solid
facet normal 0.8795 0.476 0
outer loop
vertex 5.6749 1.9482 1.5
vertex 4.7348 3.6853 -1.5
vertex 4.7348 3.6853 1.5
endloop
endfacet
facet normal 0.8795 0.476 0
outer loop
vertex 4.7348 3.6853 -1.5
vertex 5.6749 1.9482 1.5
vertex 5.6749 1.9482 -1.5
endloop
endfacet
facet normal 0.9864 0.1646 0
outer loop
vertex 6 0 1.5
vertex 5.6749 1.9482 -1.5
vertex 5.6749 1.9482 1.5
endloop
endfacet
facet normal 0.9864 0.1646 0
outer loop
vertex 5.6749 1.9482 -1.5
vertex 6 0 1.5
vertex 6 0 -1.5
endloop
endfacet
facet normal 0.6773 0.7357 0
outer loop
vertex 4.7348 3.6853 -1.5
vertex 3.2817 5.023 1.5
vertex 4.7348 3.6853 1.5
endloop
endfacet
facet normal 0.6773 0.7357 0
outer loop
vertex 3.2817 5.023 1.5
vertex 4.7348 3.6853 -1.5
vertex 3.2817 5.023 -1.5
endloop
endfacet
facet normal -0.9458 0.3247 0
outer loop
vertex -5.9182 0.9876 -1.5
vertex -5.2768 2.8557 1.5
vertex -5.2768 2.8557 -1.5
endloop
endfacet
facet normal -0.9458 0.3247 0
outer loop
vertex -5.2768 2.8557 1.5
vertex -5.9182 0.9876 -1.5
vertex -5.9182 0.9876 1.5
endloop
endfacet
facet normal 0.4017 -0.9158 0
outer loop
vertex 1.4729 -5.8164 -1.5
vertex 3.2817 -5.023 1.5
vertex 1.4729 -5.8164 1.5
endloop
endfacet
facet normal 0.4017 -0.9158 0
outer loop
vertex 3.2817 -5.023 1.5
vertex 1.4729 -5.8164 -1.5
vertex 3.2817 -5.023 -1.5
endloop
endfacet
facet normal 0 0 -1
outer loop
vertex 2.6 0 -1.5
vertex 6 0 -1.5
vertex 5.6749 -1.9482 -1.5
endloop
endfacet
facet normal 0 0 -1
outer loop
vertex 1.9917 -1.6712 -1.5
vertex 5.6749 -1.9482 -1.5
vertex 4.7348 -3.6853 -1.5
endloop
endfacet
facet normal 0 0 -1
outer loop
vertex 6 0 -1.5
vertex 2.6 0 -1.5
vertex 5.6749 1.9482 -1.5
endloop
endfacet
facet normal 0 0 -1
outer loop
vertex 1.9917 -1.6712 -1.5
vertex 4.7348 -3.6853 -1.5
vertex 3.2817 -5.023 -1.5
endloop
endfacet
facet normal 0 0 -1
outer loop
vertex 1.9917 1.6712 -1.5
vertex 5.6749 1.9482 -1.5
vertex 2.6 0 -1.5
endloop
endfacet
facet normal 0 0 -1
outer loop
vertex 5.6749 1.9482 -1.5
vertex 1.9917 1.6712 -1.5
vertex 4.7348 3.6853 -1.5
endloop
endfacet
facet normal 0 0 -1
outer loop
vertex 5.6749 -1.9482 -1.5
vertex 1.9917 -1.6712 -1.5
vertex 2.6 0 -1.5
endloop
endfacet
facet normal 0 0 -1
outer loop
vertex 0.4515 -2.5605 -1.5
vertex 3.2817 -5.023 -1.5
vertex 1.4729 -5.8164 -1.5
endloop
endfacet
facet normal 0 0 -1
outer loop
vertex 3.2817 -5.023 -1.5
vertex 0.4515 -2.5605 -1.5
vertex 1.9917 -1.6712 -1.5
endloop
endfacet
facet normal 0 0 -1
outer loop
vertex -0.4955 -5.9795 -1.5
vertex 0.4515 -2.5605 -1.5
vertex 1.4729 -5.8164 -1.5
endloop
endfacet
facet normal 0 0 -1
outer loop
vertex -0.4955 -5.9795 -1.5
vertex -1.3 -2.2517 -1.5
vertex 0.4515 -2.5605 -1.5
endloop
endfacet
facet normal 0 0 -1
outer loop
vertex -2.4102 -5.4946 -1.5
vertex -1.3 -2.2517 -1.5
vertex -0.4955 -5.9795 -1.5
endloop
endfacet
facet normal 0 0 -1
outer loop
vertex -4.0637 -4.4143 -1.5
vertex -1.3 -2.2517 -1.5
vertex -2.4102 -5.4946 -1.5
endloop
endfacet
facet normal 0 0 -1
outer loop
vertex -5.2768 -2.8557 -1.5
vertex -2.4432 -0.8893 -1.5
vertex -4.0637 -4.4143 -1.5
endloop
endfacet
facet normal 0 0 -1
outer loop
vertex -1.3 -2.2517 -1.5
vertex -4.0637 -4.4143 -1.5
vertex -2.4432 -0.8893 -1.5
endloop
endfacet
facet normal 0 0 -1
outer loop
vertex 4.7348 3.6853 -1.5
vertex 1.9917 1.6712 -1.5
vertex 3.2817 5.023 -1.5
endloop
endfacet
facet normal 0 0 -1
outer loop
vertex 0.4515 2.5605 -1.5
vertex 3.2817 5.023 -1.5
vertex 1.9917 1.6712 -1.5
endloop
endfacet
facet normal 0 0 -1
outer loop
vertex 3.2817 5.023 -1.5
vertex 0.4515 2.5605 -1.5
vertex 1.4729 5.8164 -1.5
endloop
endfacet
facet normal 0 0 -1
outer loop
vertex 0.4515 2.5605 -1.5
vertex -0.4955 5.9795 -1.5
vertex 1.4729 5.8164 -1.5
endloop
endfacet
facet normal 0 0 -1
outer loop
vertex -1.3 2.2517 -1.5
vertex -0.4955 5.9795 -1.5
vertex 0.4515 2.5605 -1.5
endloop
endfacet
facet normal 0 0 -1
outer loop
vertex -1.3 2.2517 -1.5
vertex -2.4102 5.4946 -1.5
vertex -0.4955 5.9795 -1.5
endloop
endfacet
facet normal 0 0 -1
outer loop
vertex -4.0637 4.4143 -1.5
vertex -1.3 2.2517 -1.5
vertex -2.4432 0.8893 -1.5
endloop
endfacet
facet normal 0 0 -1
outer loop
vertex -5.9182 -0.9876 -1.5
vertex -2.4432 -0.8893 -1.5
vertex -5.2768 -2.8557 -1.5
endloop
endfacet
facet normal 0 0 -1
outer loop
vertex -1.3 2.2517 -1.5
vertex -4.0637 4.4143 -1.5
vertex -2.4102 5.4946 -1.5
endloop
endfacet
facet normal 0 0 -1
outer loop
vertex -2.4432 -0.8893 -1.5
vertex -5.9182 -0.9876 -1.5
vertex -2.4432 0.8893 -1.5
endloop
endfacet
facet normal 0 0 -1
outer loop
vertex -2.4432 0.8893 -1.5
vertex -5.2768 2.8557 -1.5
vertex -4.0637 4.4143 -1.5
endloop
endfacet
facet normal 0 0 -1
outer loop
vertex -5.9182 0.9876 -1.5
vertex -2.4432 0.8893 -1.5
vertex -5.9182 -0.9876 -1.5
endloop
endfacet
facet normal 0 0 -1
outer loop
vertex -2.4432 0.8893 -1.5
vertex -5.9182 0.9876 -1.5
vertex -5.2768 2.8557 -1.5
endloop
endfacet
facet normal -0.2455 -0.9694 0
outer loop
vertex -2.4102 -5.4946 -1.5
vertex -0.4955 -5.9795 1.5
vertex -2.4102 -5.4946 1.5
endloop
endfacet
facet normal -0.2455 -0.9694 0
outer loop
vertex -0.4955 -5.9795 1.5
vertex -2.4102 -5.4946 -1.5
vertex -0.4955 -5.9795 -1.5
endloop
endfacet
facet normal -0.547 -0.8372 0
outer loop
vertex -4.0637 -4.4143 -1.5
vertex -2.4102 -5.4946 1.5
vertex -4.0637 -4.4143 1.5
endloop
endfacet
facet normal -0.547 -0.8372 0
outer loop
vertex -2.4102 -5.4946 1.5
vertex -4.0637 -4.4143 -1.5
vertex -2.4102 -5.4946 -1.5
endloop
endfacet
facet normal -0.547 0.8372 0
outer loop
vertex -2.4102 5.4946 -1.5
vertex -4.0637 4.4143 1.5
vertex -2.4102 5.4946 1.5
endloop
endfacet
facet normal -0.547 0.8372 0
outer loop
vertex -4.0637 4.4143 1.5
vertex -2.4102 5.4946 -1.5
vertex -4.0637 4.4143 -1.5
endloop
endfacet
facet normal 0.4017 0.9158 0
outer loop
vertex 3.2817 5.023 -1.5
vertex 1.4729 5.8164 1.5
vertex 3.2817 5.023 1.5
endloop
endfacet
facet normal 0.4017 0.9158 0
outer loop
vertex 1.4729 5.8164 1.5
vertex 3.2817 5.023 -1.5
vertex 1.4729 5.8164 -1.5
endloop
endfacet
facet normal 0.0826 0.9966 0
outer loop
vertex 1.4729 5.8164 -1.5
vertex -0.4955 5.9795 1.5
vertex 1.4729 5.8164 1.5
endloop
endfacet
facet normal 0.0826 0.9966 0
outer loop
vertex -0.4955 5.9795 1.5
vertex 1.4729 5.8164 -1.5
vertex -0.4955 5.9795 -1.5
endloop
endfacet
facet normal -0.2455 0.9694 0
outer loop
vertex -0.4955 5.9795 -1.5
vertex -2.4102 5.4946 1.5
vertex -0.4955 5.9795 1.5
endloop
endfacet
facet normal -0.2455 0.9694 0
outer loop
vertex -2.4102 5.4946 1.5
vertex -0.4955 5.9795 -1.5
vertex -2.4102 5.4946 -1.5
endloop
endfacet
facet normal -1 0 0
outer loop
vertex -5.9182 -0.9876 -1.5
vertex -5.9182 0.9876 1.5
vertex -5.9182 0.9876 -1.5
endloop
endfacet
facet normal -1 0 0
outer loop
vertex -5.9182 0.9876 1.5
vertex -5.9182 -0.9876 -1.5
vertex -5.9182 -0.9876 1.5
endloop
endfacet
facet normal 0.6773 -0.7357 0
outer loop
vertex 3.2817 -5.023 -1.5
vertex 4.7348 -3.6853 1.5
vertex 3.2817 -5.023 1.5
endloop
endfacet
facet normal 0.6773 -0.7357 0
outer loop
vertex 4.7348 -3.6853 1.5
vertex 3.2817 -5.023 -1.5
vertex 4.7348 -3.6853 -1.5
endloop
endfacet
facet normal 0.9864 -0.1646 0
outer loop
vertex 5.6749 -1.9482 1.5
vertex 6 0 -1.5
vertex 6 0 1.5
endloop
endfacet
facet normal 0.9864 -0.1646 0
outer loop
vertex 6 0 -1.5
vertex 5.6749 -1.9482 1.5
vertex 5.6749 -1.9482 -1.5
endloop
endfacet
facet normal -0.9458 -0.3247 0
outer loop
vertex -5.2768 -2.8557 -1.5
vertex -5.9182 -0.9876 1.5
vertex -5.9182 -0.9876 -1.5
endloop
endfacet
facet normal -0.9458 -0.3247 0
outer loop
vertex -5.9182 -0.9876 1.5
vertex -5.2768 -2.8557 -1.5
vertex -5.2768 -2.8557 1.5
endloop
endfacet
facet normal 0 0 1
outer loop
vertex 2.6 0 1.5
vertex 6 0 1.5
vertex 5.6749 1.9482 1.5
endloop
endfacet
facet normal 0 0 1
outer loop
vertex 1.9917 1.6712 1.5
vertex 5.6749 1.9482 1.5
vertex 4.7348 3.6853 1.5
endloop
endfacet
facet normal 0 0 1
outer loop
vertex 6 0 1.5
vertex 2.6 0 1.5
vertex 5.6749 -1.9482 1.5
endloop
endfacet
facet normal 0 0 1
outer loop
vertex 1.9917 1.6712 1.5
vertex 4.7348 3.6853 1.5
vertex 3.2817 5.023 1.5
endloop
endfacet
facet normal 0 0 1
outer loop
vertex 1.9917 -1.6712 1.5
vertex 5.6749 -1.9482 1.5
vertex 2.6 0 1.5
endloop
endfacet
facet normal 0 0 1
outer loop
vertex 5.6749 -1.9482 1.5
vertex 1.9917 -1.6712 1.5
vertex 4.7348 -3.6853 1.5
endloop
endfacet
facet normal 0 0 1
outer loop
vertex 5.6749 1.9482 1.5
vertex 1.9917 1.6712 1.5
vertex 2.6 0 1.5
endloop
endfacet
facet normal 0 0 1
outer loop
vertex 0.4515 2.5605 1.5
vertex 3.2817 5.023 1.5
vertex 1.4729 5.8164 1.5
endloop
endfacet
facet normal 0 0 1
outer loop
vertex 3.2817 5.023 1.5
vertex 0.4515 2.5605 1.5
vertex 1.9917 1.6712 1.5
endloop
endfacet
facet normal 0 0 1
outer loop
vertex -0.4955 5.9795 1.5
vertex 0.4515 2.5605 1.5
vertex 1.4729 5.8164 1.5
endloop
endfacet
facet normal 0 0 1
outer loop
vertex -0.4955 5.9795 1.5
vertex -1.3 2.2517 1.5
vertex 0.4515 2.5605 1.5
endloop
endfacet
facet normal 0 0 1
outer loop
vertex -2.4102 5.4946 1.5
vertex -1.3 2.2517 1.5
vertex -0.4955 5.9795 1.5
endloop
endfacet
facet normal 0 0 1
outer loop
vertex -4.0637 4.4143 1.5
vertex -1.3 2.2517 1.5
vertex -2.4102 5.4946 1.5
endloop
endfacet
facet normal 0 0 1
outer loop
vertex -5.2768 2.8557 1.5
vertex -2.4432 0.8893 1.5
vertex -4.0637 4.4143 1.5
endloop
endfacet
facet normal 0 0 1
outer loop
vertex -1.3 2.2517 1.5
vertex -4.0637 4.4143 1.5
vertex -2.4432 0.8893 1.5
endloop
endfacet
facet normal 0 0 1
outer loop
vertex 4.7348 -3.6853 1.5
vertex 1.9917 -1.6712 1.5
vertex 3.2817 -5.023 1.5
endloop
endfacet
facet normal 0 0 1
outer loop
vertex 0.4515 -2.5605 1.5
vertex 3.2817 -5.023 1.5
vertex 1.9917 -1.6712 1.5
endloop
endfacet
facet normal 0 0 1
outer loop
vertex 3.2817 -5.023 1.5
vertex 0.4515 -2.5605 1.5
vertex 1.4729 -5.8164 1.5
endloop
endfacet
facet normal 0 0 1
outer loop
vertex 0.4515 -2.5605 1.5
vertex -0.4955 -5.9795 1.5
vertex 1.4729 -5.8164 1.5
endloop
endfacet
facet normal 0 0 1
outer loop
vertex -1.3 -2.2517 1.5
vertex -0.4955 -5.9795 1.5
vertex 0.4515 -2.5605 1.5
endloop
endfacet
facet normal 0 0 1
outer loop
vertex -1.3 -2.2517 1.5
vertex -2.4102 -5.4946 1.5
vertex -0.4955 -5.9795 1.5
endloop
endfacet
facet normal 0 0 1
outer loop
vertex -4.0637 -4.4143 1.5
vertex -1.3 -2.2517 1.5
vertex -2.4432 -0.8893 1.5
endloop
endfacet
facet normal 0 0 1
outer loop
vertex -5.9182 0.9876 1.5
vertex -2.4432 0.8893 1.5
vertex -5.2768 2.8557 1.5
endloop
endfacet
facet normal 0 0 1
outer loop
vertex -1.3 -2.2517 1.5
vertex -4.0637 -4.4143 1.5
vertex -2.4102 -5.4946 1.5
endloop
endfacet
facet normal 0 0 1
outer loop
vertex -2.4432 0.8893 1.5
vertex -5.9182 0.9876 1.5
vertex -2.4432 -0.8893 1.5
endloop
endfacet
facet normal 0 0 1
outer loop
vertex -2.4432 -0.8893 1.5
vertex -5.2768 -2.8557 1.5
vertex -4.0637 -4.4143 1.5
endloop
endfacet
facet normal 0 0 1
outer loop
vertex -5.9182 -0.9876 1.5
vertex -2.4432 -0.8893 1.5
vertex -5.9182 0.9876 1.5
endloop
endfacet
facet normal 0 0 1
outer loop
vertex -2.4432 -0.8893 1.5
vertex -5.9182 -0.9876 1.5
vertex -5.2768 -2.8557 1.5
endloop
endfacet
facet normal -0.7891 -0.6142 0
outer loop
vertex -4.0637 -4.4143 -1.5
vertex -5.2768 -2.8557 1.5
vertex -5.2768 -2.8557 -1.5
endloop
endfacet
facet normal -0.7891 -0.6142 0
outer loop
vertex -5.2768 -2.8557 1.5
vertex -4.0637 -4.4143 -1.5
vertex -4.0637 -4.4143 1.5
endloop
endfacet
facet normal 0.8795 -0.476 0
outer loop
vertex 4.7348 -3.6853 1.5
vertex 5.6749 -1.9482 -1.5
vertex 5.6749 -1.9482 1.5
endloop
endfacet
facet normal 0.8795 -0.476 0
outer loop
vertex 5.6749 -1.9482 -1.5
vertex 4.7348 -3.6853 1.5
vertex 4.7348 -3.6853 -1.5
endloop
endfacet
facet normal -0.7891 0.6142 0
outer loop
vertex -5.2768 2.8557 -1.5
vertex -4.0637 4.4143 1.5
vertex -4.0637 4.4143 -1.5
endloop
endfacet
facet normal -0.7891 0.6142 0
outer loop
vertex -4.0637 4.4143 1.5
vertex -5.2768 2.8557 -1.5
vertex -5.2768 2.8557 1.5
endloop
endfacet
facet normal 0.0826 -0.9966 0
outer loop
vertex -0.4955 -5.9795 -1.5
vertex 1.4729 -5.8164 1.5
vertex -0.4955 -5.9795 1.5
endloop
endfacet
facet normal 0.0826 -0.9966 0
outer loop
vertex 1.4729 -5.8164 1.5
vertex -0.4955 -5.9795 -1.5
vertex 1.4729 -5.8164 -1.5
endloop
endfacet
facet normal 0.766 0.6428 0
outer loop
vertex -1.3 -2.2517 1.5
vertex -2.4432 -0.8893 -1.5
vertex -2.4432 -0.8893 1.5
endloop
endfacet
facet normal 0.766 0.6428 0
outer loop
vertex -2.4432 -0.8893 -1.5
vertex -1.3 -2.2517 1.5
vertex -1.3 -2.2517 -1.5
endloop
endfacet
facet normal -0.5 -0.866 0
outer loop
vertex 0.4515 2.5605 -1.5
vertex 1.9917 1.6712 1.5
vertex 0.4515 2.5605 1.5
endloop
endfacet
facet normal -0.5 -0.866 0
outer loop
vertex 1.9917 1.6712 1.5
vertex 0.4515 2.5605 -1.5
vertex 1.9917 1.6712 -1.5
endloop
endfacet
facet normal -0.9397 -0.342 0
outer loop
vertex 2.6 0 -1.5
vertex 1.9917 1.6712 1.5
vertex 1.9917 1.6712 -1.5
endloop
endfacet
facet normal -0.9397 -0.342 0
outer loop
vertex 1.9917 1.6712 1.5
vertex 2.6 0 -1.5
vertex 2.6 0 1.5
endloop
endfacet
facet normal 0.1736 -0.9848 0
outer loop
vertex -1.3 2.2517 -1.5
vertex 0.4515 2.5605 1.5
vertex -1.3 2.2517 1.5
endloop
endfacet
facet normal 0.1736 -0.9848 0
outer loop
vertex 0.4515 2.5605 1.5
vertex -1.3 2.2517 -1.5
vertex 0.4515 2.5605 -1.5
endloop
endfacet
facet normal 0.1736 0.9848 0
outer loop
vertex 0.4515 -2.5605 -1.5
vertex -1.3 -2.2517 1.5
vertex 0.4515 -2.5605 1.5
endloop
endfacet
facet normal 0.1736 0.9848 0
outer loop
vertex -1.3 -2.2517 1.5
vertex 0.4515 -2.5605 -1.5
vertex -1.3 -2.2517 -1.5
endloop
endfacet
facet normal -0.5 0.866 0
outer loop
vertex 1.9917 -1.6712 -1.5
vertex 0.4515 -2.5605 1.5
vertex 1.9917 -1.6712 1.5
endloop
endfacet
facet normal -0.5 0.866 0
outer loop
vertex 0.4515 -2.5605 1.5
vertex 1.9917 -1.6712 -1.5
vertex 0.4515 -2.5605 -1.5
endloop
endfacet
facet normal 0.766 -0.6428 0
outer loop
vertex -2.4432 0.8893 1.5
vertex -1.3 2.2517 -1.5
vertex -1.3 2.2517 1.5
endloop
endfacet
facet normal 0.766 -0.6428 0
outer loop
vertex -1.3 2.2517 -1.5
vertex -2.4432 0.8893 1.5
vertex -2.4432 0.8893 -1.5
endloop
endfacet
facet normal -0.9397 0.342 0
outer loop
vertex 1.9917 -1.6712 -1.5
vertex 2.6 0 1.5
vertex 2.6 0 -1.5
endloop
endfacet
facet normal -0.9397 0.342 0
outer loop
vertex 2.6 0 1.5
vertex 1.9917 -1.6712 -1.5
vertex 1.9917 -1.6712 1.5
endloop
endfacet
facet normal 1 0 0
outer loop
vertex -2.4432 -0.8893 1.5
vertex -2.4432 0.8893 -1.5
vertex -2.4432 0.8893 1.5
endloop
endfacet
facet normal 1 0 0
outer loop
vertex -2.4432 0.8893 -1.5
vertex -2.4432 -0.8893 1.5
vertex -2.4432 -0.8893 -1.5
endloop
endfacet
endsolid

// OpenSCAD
// Parameters
magnet_type = 0; //[0:2:1]
magnet_od_t0 = 10; //[5:20:1]
magnet_id_t0 = 0; //[0:8:1]
magnet_h_t0 = 3; //[2:6:1]
magnet_r_t0 = 0.5; //[0.2:1.5:0.1]
magnet_od_t1 = 12; //[6:24:1]
magnet_id_t1 = 5; //[1:12:1]
magnet_h_t1 = 3; //[2:8:1]
magnet_r_t1 = 0.5; //[0.2:1.5:0.1]
magnet_od_t2 = 20; //[10:40:1]
magnet_id_t2 = 0; //[0:16:1]
magnet_h_t2 = 10; //[5:20:1]
magnet_r_t2 = 1; //[0.2:3:0.1]
magnet_od = 12; //[6:24:1]
magnet_id = 5; //[0:12:1]
magnet_h = 3; //[2:20:1]
bore_clearance = 0.2; //[0.0:0.6:0.05]

// Magnet module
module magnet() {
  color([0.8, 0.6, 0.2]) { // Brass-like color for magnet
    difference() {
      // Outer cylinder
      cylinder(r=magnet_od/2, h=magnet_h, center=true);
      // Inner bore
      if (magnet_id > 0) {
        cylinder(r=(magnet_id + bore_clearance)/2, h=magnet_h + 2, center=true);
      }
    }
  }
}

// Assembly
module assembly() {
  magnet();
}

assembly();
